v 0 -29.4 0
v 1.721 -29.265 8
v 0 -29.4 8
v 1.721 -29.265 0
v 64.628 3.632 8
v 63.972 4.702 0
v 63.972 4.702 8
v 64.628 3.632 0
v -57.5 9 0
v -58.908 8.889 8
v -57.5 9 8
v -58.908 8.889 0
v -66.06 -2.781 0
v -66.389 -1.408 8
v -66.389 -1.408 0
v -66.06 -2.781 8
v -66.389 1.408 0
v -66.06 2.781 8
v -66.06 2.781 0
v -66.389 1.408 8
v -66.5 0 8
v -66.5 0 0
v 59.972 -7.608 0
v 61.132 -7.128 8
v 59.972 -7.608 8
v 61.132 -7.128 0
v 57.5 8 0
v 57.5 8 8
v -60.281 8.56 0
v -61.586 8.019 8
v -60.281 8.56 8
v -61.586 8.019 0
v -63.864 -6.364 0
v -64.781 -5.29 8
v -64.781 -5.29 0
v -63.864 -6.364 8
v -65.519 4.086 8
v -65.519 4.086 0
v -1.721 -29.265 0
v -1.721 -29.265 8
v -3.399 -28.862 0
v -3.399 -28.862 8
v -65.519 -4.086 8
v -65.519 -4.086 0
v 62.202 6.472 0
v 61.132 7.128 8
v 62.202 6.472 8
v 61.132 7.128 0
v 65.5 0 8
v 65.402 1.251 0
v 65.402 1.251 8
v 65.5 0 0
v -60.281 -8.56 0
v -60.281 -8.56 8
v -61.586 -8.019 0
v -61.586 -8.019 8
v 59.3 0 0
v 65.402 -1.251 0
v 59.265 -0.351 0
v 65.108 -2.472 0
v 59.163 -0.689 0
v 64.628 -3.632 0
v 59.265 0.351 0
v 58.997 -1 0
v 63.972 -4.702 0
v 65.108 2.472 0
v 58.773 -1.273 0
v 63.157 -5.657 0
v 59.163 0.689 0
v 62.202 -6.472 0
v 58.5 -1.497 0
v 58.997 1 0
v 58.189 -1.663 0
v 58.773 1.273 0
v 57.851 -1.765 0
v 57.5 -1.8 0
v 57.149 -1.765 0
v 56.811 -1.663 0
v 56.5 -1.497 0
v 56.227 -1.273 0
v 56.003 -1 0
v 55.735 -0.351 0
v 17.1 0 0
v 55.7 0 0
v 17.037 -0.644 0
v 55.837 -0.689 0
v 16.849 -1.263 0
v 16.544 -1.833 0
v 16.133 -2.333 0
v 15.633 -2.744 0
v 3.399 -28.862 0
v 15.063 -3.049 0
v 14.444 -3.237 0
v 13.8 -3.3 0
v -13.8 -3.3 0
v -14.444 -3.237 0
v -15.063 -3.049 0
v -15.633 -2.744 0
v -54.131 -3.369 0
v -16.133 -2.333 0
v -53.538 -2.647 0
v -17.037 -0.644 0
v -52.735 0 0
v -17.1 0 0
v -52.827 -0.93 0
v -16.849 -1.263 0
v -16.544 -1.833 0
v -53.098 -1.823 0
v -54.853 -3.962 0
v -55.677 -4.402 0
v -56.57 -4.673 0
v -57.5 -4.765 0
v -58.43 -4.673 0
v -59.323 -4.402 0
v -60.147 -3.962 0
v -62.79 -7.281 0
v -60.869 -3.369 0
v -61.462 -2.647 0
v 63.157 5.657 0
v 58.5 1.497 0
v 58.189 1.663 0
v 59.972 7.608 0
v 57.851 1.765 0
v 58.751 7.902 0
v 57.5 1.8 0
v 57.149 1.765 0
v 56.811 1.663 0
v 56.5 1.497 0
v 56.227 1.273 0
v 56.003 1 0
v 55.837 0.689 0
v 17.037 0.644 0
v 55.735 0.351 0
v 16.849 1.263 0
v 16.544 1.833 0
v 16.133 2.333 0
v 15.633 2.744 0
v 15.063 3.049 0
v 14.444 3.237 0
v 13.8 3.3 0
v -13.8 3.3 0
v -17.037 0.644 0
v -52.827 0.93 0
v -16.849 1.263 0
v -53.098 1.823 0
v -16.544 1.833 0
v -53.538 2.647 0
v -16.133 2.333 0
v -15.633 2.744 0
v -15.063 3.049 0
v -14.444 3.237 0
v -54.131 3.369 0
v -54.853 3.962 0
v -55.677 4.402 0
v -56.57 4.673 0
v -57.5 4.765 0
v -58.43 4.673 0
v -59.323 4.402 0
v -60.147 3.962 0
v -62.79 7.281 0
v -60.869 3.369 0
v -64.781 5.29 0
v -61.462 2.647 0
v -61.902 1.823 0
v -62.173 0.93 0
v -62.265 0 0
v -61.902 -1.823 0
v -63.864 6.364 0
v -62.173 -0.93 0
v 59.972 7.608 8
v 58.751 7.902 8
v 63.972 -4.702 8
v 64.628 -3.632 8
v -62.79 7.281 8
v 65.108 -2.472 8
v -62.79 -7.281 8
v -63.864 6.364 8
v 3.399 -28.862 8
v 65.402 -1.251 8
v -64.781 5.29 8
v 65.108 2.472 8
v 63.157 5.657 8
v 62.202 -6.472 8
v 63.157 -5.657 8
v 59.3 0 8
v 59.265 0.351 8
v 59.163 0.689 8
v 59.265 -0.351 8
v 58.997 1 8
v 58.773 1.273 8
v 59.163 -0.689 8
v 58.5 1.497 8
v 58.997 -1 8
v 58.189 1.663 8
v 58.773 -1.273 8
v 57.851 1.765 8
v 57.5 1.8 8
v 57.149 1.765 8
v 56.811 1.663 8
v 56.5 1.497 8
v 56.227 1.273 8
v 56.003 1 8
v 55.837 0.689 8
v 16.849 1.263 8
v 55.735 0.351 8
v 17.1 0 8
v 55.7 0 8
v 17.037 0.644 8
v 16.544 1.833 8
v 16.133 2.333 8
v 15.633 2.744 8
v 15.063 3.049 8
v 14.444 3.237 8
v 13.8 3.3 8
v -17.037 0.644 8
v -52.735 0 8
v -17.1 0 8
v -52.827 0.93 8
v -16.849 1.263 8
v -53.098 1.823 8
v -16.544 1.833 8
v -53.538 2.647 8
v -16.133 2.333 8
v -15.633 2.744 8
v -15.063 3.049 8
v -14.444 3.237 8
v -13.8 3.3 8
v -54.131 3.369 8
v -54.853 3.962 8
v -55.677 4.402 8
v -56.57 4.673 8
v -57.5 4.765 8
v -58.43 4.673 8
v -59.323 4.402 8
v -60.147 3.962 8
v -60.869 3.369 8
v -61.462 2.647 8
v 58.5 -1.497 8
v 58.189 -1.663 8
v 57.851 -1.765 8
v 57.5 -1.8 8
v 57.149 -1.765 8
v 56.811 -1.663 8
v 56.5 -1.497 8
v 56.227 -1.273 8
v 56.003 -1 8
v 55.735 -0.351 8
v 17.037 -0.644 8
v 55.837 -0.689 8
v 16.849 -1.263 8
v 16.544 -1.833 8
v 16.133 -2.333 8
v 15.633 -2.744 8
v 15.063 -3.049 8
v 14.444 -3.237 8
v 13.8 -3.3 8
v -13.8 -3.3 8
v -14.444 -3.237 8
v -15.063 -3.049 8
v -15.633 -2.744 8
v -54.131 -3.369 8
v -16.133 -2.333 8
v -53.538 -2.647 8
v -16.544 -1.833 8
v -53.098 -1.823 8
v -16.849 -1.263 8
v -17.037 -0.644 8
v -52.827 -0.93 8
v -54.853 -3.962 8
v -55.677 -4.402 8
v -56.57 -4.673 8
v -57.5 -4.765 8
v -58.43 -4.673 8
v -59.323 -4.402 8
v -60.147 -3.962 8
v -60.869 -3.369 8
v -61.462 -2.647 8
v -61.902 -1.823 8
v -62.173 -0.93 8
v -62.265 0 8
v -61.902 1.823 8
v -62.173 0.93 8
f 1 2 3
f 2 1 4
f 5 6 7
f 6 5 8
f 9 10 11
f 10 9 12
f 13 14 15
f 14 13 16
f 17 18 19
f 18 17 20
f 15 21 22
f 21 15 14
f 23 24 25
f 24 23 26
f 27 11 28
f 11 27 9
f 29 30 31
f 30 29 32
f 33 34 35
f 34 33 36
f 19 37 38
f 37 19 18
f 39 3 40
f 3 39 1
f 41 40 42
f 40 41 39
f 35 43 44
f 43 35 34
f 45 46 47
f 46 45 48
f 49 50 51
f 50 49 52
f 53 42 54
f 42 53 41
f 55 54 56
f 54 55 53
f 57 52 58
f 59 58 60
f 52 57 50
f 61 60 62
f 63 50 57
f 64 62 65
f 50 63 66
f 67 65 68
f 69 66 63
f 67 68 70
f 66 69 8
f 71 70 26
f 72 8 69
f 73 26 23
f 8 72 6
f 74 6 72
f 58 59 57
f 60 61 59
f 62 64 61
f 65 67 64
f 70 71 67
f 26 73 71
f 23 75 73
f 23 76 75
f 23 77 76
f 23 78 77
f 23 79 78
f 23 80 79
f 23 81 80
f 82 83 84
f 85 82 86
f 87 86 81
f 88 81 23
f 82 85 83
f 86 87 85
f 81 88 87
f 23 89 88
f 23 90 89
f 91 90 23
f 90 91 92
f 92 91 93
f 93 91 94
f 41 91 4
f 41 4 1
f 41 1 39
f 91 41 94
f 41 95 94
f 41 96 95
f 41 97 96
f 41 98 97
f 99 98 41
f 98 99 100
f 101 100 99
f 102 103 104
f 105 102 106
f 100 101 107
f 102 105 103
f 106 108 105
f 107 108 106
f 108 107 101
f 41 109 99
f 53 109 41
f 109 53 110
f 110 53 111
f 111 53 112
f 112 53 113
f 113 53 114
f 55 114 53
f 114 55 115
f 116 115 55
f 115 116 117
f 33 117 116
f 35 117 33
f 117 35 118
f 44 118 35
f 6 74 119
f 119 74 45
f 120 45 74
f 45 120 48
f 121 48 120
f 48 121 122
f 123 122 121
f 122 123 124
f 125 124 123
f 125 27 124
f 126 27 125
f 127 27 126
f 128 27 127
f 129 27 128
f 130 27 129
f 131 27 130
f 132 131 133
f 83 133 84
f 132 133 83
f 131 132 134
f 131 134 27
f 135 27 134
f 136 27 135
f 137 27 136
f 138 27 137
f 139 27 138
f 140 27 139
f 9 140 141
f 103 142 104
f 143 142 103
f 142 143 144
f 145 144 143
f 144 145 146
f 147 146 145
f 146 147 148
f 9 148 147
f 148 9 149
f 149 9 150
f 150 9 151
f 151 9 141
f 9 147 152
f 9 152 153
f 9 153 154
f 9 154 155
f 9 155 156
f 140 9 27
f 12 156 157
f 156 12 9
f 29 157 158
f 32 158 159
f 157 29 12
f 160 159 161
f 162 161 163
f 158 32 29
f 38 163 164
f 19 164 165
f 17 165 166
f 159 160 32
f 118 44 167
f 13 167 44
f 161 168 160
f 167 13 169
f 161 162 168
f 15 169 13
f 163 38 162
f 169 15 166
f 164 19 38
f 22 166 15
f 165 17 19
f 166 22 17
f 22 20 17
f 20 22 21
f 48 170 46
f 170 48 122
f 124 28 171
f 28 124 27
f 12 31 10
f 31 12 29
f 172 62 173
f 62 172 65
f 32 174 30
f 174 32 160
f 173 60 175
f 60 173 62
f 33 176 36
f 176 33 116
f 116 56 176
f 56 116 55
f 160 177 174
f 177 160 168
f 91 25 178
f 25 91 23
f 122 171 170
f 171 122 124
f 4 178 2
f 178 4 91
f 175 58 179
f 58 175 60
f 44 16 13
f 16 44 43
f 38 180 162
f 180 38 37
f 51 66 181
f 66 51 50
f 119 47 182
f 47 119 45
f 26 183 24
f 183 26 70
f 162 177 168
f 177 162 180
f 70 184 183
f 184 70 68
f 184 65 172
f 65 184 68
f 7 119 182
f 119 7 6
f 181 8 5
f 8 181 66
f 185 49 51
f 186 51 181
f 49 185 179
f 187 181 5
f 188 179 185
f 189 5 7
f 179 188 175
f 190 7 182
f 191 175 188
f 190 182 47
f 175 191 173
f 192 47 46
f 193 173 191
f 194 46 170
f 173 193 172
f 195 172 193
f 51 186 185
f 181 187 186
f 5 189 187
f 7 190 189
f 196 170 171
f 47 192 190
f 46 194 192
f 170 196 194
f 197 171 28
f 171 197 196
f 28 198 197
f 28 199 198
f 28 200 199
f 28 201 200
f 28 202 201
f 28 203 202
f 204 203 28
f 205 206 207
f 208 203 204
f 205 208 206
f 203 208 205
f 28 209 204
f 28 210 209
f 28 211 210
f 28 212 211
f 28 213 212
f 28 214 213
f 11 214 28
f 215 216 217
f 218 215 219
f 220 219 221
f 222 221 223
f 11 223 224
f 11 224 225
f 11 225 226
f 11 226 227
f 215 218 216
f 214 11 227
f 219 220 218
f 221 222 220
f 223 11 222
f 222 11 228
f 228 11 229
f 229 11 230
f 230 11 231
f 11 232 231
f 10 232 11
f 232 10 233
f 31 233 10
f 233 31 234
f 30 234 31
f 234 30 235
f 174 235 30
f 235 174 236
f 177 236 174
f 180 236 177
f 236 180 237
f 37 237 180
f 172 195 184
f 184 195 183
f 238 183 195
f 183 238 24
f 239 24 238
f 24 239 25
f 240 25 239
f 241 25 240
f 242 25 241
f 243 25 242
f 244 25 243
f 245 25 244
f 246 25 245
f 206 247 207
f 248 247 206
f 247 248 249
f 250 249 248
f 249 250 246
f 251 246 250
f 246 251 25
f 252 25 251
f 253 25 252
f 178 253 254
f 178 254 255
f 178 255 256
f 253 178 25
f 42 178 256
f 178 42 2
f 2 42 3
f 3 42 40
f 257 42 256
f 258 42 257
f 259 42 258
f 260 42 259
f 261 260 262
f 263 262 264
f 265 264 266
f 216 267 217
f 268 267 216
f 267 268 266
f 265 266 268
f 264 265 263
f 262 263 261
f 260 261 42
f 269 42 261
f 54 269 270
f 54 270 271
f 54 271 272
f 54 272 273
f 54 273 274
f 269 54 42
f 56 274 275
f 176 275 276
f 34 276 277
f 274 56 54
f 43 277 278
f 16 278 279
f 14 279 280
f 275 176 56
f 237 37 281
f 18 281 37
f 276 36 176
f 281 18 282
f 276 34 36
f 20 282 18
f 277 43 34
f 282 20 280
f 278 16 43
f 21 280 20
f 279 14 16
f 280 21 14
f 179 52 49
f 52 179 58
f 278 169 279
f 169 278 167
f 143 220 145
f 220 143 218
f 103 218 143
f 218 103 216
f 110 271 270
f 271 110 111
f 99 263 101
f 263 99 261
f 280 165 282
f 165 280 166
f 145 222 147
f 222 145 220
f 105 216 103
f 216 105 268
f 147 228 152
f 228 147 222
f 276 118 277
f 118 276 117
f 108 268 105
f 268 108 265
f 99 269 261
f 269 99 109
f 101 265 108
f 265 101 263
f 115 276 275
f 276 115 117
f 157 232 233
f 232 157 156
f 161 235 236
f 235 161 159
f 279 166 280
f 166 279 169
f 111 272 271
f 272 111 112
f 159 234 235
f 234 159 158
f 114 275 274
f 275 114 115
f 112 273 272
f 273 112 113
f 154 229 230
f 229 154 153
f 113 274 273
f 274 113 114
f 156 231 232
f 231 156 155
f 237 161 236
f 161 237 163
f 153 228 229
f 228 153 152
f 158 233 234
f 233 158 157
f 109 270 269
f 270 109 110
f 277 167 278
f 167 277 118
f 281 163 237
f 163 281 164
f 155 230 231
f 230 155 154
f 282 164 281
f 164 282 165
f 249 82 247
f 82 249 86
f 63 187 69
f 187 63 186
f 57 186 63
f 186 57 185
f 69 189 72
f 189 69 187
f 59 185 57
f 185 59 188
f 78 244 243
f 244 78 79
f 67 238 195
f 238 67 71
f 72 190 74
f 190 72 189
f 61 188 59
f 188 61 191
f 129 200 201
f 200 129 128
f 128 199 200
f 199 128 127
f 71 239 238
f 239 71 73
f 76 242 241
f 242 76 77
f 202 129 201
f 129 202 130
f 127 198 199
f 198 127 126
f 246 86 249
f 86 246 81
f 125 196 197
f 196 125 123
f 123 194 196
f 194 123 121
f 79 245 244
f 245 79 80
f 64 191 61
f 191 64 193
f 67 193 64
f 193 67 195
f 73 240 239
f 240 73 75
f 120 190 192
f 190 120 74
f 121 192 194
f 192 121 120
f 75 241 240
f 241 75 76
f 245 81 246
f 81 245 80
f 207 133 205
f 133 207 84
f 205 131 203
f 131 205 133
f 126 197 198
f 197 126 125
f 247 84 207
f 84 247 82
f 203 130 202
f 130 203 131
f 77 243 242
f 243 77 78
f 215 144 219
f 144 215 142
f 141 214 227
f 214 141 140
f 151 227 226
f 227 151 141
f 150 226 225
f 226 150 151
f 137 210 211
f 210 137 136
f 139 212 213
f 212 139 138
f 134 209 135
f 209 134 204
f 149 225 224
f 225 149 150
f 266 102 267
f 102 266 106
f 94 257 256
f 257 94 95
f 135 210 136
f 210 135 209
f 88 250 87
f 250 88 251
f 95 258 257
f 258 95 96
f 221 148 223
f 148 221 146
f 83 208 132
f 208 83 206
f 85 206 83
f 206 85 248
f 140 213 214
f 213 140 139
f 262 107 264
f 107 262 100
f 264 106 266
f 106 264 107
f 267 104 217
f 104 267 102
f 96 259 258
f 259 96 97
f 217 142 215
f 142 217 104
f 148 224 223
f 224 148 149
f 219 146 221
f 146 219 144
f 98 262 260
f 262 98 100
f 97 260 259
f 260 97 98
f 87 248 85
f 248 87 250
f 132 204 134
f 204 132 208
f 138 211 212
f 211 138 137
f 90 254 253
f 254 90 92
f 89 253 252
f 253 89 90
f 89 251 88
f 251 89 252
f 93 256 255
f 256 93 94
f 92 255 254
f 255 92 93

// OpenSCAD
$fn = 32;

// ----------------------------------------------------------------------
// Lever: 115 mm between the bosses, 8 mm thick, smooth outline
// ----------------------------------------------------------------------

// --- parameters (mm) ---
lever_l = 115;            // distance between the boss centres
boss_a = 18;              // first boss diameter
boss_b = 16;              // second boss diameter
bore_a = 9.53;            // first bore
bore_b = 3.6;             // second bore
lever_t = 8;              // lever thickness
boss_c = 22;              // middle boss diameter
bend = 18.4;              // how far the middle boss drops
slot_w = 6.6;             // adjustment slot width

lever_profile = [[-66.5, 0], [-66.389, -1.408], [-66.06, -2.781], [-65.519, -4.086], [-64.781, -5.29], [-63.864, -6.364], [-62.79, -7.281], [-61.586, -8.019], [-60.281, -8.56], [-3.399, -28.862], [-1.721, -29.265], [0, -29.4], [1.721, -29.265], [3.399, -28.862], [59.972, -7.608], [61.132, -7.128], [62.202, -6.472], [63.157, -5.657], [63.972, -4.702], [64.628, -3.632], [65.108, -2.472], [65.402, -1.251], [65.5, 0], [65.402, 1.251], [65.108, 2.472], [64.628, 3.632], [63.972, 4.702], [63.157, 5.657], [62.202, 6.472], [61.132, 7.128], [59.972, 7.608], [58.751, 7.902], [57.5, 8], [-57.5, 9], [-58.908, 8.889], [-60.281, 8.56], [-61.586, 8.019], [-62.79, 7.281], [-63.864, 6.364], [-64.781, 5.29], [-65.519, 4.086], [-66.06, 2.781], [-66.389, 1.408]];

difference() {
  linear_extrude(height = lever_t) polygon(lever_profile);
  translate([-57.5, 0, -2.5]) cylinder(h = lever_t + 5, d = bore_a);
  translate([57.5, 0, -2.5]) cylinder(h = lever_t + 5, d = bore_b);
  /* slotted adjustment, stadium shaped */
  hull() {
    translate([-13.8, 0, -2.5]) cylinder(h = lever_t + 5, d = slot_w);
    translate([13.8, 0, -2.5]) cylinder(h = lever_t + 5, d = slot_w);
  }
}
